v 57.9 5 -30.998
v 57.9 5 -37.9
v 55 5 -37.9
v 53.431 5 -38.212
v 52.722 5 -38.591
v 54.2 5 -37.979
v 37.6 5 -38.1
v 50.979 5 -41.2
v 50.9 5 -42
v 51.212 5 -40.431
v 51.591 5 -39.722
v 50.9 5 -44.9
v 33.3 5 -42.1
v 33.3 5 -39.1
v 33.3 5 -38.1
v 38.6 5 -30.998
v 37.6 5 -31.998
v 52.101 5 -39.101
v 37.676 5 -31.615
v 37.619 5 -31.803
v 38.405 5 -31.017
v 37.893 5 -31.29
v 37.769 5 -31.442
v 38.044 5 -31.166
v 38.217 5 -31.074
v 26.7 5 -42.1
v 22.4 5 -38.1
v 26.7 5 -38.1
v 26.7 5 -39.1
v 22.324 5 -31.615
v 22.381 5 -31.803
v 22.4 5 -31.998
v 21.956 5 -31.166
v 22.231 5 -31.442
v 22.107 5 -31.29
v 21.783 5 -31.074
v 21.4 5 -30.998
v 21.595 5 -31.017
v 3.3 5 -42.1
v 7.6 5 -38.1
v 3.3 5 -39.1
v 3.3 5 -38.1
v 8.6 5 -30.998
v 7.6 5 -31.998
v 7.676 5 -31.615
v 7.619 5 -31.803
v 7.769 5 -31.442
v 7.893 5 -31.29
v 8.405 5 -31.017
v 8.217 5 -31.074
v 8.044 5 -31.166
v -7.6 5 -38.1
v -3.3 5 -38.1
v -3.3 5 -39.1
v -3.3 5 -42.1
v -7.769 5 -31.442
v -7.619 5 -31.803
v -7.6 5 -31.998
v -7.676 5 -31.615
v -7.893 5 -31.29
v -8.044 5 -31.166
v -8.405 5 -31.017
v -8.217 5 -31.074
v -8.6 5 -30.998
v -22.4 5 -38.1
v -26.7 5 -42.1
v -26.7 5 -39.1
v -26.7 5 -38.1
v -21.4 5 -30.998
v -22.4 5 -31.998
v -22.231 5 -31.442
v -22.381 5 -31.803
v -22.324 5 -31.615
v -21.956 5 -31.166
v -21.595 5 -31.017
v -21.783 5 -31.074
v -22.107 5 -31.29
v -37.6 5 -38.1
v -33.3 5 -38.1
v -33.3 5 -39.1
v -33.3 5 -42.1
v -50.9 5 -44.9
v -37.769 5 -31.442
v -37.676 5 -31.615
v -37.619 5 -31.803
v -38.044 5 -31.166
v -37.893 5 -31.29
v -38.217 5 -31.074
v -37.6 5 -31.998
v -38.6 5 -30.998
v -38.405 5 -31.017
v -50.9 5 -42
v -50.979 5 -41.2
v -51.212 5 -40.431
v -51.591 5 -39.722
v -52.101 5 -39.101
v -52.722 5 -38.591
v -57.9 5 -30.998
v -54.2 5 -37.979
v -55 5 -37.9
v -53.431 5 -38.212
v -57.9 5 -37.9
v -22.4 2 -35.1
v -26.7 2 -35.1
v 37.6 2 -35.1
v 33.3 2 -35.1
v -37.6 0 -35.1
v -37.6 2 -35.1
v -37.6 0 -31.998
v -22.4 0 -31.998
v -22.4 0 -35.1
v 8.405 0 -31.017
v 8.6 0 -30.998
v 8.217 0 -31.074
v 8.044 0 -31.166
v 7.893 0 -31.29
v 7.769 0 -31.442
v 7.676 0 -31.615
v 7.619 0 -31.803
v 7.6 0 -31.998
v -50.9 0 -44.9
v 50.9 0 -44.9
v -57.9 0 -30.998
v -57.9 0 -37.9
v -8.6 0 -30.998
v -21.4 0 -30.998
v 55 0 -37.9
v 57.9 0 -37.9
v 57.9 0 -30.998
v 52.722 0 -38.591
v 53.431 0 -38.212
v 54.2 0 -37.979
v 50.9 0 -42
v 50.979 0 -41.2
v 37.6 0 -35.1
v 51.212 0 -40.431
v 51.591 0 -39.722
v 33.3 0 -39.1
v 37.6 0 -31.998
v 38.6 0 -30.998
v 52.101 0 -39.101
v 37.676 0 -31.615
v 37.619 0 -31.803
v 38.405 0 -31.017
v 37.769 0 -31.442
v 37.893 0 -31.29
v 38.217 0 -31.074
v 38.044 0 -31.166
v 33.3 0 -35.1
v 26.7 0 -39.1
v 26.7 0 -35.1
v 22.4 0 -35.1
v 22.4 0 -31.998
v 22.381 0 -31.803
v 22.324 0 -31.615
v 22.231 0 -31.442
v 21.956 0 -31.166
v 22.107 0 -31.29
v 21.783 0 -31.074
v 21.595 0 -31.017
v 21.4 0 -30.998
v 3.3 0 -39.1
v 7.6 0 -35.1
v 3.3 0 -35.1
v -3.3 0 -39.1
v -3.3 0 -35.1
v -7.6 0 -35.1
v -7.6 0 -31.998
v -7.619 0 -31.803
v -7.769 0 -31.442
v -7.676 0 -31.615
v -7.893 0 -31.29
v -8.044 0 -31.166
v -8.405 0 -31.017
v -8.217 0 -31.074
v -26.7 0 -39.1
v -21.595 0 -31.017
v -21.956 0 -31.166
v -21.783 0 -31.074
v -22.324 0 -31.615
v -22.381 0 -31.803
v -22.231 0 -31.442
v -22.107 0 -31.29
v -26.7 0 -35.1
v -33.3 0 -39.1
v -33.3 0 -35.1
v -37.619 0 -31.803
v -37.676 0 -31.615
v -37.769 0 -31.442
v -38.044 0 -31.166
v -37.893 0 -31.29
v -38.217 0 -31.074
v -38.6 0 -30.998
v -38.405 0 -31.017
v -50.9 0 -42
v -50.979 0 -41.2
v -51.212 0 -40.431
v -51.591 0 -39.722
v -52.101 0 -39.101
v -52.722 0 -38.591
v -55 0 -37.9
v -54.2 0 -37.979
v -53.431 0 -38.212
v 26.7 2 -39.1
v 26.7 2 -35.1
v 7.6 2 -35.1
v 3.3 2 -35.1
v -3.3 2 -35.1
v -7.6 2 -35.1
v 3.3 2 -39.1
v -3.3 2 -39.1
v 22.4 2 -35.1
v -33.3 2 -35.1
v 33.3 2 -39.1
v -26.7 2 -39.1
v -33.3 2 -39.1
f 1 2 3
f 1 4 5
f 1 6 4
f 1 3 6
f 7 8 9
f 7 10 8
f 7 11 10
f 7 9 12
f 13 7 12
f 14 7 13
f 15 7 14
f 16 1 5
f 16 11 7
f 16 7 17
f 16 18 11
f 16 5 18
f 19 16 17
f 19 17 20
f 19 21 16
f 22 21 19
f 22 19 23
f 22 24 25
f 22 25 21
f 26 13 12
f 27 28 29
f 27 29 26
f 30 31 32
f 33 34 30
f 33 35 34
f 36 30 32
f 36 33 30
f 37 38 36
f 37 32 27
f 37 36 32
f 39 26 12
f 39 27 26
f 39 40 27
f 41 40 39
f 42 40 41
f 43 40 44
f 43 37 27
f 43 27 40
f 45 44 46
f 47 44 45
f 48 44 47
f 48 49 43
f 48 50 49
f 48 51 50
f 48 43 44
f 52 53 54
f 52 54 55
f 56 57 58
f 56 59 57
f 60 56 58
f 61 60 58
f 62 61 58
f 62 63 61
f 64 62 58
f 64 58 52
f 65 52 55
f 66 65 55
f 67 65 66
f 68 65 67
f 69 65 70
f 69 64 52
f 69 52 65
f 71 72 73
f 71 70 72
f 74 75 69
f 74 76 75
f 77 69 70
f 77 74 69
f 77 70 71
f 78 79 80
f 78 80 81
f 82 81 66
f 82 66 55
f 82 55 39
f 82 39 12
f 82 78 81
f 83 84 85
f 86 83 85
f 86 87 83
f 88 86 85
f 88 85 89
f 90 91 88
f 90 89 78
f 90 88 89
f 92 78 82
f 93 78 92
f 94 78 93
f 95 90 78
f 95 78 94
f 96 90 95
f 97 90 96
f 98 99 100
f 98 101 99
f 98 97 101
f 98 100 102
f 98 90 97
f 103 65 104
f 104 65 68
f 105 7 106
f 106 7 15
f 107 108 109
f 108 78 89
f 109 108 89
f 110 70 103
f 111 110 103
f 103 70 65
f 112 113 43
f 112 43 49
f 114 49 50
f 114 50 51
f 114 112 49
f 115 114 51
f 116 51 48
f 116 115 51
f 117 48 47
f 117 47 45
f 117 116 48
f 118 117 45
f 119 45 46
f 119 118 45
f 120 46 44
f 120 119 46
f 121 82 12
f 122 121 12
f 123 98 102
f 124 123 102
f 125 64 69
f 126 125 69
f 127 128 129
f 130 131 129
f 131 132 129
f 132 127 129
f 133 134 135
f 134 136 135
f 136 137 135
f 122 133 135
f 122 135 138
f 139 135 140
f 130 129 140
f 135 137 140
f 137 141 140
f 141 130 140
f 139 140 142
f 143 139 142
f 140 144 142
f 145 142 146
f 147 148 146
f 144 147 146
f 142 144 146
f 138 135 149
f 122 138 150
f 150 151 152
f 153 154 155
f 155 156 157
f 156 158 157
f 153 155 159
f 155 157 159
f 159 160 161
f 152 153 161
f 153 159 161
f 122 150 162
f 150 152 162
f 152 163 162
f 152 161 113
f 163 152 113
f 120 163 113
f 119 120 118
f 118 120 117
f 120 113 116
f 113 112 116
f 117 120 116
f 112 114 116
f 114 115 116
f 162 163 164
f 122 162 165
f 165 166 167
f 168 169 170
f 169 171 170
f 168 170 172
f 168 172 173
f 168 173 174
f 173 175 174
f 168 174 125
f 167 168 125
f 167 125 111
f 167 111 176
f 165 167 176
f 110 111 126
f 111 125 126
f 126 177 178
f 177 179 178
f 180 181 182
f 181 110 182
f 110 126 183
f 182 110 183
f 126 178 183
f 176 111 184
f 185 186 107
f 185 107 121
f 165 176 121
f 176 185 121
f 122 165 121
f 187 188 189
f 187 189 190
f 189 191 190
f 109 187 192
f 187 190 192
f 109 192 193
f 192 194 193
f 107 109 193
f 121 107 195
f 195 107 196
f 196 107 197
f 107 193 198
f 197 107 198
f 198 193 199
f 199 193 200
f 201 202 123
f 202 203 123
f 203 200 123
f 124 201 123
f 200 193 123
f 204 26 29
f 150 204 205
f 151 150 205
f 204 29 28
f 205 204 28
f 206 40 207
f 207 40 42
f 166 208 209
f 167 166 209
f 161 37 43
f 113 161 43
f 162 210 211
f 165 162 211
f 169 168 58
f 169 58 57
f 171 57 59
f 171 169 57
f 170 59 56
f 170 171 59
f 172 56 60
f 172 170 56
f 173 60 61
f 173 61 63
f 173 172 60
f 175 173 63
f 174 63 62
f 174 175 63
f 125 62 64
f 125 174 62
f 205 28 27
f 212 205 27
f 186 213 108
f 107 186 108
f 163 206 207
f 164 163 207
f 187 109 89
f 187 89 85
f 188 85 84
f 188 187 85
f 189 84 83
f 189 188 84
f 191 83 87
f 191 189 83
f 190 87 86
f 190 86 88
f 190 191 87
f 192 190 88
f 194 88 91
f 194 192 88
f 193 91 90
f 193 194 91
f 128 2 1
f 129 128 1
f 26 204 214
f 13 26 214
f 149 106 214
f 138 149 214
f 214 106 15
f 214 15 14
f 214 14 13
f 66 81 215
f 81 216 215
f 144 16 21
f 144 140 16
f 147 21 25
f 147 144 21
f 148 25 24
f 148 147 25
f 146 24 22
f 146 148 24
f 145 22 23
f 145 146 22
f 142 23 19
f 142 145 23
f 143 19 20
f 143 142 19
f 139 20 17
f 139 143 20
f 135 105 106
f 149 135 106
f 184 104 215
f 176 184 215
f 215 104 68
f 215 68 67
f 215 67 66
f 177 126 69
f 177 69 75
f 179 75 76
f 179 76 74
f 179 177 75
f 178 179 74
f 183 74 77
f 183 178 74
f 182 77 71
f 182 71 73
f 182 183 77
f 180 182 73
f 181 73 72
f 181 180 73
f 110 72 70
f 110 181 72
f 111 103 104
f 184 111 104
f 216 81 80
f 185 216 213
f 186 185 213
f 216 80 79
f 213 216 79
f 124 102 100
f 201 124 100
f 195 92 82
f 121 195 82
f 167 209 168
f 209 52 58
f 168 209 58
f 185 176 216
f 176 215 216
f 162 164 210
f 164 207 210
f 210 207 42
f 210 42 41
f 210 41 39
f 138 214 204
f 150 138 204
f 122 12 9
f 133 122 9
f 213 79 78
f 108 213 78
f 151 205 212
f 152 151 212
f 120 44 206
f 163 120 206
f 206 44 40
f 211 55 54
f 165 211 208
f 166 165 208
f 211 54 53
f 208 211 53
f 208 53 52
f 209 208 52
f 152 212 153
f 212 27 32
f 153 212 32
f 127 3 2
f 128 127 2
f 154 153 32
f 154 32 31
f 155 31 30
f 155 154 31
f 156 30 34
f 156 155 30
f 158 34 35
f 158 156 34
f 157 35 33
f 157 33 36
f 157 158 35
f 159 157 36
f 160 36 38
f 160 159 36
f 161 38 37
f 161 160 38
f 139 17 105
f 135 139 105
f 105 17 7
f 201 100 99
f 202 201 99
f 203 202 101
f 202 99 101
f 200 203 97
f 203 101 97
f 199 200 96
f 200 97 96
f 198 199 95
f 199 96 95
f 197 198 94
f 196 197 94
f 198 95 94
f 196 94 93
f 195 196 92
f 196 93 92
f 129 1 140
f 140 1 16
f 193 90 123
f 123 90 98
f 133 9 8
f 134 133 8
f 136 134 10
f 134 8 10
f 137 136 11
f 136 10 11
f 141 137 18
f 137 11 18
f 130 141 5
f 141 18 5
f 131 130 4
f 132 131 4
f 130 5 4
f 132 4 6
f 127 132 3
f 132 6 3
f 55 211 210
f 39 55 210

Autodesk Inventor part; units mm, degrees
ref_plane "YZ Plane" through (0, 0, 0) normal (1, 0, 0) x (0, 1, 0)
ref_plane "XZ Plane" through (0, 0, 0) normal (0, 1, 0) x (-1, 0, 0)
ref_plane "XY Plane" through (0, 0, 0) normal (0, 0, 1) x (1, 0, 0)
sketch "Esquisse1" plane through (0, 0, 0) normal (0, 1, 0) x (-1, 0, 0)
  line L0 (60, -42) -> (60, 42)
  line L1 (55, 39) -> (57, 39)
  arc A0 (52, 42) -> (55, 39) centre (55, 42) ccw
  line L2 (52, 44) -> (52, 42)
  line L3 (55, 46) -> (-55, 46)
  circle A1 centre (55, 42.115) radius 2
  arc A2 (60, 42) -> (55, 47) centre (55, 42) ccw
  line L4 (55, 47) -> (-55, 47)
  line L5 (-55, 47) -> (55, 47)
  line L6 (51, 45) -> (-51, 45)
  line L7 (-52, 42) -> (-51, 42)
  arc A3 (-57, 39) -> (-58, 38) centre (-57, 38) ccw
  circle A4 centre (-55, 42.115) radius 2
  line L8 (-55, 39) -> (-55, 38)
  line L9 (-52, 44) -> (-52, 42)
  arc A5 (-51, 45) -> (-52, 44) centre (-51, 44) ccw
  line L10 (-55, 39) -> (-57, 39)
  arc A6 (-55, 39) -> (-52, 42) centre (-55, 42) ccw
  arc A7 (-57, 39) -> (-58, 38) centre (-57, 38) ccw
  circle A8 centre (55, -42.115) radius 2
  line L11 (-55, -39) -> (-57, -39)
  arc A9 (-52, -42) -> (-55, -39) centre (-55, -42) ccw
  line L12 (-52, -44) -> (-52, -42)
  line L13 (52, -42) -> (52, -44)
  circle A10 centre (-55, -42.115) radius 2
  line L14 (-51, -45) -> (51, -45)
  line L15 (51, -45) -> (-51, -45)
  line L16 (-55, -46) -> (55, -46)
  line L17 (-55, -47) -> (55, -47)
  line L18 (55, -47) -> (-55, -47)
  arc A11 (-51, 45) -> (-52, 44) centre (-51, 44) ccw
  line L19 (-52, 42) -> (-52, 44)
  arc A12 (-55, 46) -> (-59, 42) centre (-55, 42) ccw
  line L20 (-51, 42) -> (-51, 45)
  arc A13 (-55, 47) -> (-60, 42) centre (-55, 42) ccw
  circle A14 centre (-55, 42.115) radius 2
  line L21 (-55, 46) -> (-55, 47)
  arc A15 (-55, 47) -> (-60, 42) centre (-55, 42) ccw
  line L22 (52, -42) -> (51, -42)
  arc A16 (51, -45) -> (52, -44) centre (51, -44) ccw
  line L23 (-51, 45) -> (51, 45)
  arc A17 (52, 42) -> (55, 39) centre (55, 42) ccw
  line L24 (55, -39) -> (55, -38)
  line L25 (57, -39) -> (55, -39)
  line L26 (55, -39) -> (57, -39)
  arc A18 (55, -39) -> (52, -42) centre (55, -42) ccw
  arc A19 (57, -39) -> (58, -38) centre (57, -38) ccw
  line L27 (52, -44) -> (52, -42)
  arc A20 (51, -45) -> (52, -44) centre (51, -44) ccw
  circle A21 centre (55, -42.115) radius 2
  arc A22 (57, -39) -> (58, -38) centre (57, -38) ccw
  line L28 (58, 38) -> (58, -38)
  circle A23 centre (55, 42.115) radius 2
  line L29 (52, 42) -> (52, 44)
  line L30 (52, 42) -> (51, 42)
  arc A24 (52, 44) -> (51, 45) centre (51, 44) ccw
  line L31 (55, 39) -> (55, 38)
  arc A25 (52, 44) -> (51, 45) centre (51, 44) ccw
  arc A26 (58, 38) -> (57, 39) centre (57, 38) ccw
  arc A27 (58, 38) -> (57, 39) centre (57, 38) ccw
  line L32 (57, 39) -> (55, 39)
  line L33 (58, -38) -> (58, 38)
  line L34 (58, -38) -> (55, -38)
  line L35 (55, 46) -> (55, 47)
  arc A28 (59, 42) -> (55, 46) centre (55, 42) ccw
  arc A29 (60, 42) -> (55, 47) centre (55, 42) ccw
  line L36 (59, -42) -> (59, 42)
  line L37 (59, 42) -> (60, 42)
  line L38 (60, 42) -> (60, -42)
  line L39 (51, 45) -> (51, 42)
  arc A30 (51, 42) -> (55, 38) centre (55, 42) ccw
  line L40 (55, 38) -> (58, 38)
  arc A31 (55, -39) -> (52, -42) centre (55, -42) ccw
  arc A32 (55, -47) -> (60, -42) centre (55, -42) ccw
  line L41 (-55, -38) -> (-58, -38)
  arc A33 (-51, -42) -> (-55, -38) centre (-55, -42) ccw
  line L42 (-52, -42) -> (-51, -42)
  line L43 (-52, -42) -> (-52, -44)
  line L44 (-51, -45) -> (-51, -42)
  arc A34 (-52, -44) -> (-51, -45) centre (-51, -44) ccw
  circle A35 centre (-55, -42.115) radius 2
  line L45 (-55, -46) -> (-55, -47)
  arc A36 (-59, -42) -> (-55, -46) centre (-55, -42) ccw
  arc A37 (-60, -42) -> (-55, -47) centre (-55, -42) ccw
  line L46 (-60, -42) -> (-59, -42)
  arc A38 (-60, -42) -> (-55, -47) centre (-55, -42) ccw
  arc A39 (-58, -38) -> (-57, -39) centre (-57, -38) ccw
  line L47 (-57, 39) -> (-55, 39)
  arc A40 (-55, 39) -> (-52, 42) centre (-55, 42) ccw
  line L48 (-55, -39) -> (-55, -38)
  line L49 (-58, -38) -> (-58, 38)
  arc A41 (-52, -44) -> (-51, -45) centre (-51, -44) ccw
  arc A42 (-58, -38) -> (-57, -39) centre (-57, -38) ccw
  line L50 (-60, 42) -> (-60, -42)
  arc A43 (-52, -42) -> (-55, -39) centre (-55, -42) ccw
  line L51 (-57, -39) -> (-55, -39)
  line L52 (-58, 38) -> (-58, -38)
  line L53 (-58, 38) -> (-55, 38)
  arc A44 (-55, 38) -> (-51, 42) centre (-55, 42) ccw
  line L54 (-59, 42) -> (-60, 42)
  line L55 (-60, -42) -> (-60, 42)
  line L56 (-59, 42) -> (-59, -42)
  line L57 (55, -46) -> (55, -47)
  arc A45 (55, -38) -> (51, -42) centre (55, -42) ccw
  line L58 (51, -42) -> (51, -45)
  arc A46 (55, -46) -> (59, -42) centre (55, -42) ccw
  line L59 (59, -42) -> (60, -42)
  arc A47 (55, -47) -> (60, -42) centre (55, -42) ccw
  line L60 (-37.5, -35) -> (-22.5, -35)
  line L61 (-37.5, -35) -> (-22.5, -35)
  line L62 (-33.25, 35) -> (-37.5, 35)
  line L63 (-33.25, 35) -> (-31.25, 35)
  line L64 (-31.25, 32) -> (-33.25, 32)
  line L65 (-31.25, 35) -> (-31.25, 32)
  line L66 (-31.25, 32) -> (-33.25, 32)
  line L67 (-28.75, 35) -> (-31.25, 35)
  line L68 (-28.75, 32) -> (-28.75, 35)
  line L69 (-28.75, 32) -> (-28.75, 35)
  line L70 (-26.75, 32) -> (-28.75, 32)
  line L71 (-26.75, 32) -> (-28.75, 32)
  line L72 (-22.5, 35) -> (-37.5, 35)
  line L73 (-22.5, 35) -> (-26.75, 35)
  line L74 (-37.5, 35) -> (-37.5, -35)
  line L75 (-37.5, 35) -> (-37.5, -35)
  line L76 (-22.5, -35) -> (-22.5, 35)
  line L77 (-22.5, -35) -> (-22.5, 35)
  line L78 (-28.75, 35) -> (-26.75, 35)
  line L79 (-31.25, 35) -> (-31.25, 32)
  line L80 (-26.75, 35) -> (-26.75, 32)
  line L81 (-26.75, 35) -> (-26.75, 32)
  line L82 (-33.25, 32) -> (-33.25, 35)
  line L83 (-33.25, 32) -> (-33.25, 35)
  line L84 (-7.5, -35) -> (7.5, -35)
  line L85 (-7.5, -35) -> (7.5, -35)
  line L86 (-3.25, 35) -> (-7.5, 35)
  line L87 (-3.25, 35) -> (-1.25, 35)
  line L88 (-1.25, 32) -> (-3.25, 32)
  line L89 (-1.25, 35) -> (-1.25, 32)
  line L90 (-1.25, 32) -> (-3.25, 32)
  line L91 (1.25, 35) -> (-1.25, 35)
  line L92 (1.25, 32) -> (1.25, 35)
  line L93 (1.25, 32) -> (1.25, 35)
  line L94 (3.25, 32) -> (1.25, 32)
  line L95 (3.25, 32) -> (1.25, 32)
  line L96 (7.5, 35) -> (-7.5, 35)
  line L97 (7.5, 35) -> (3.25, 35)
  line L98 (-7.5, 35) -> (-7.5, -35)
  line L99 (-7.5, 35) -> (-7.5, -35)
  line L100 (7.5, -35) -> (7.5, 35)
  line L101 (7.5, -35) -> (7.5, 35)
  line L102 (1.25, 35) -> (3.25, 35)
  line L103 (-1.25, 35) -> (-1.25, 32)
  line L104 (3.25, 35) -> (3.25, 32)
  line L105 (3.25, 35) -> (3.25, 32)
  line L106 (-3.25, 32) -> (-3.25, 35)
  line L107 (-3.25, 32) -> (-3.25, 35)
  line L108 (22.5, -35) -> (37.5, -35)
  line L109 (22.5, -35) -> (37.5, -35)
  line L110 (26.75, 35) -> (22.5, 35)
  line L111 (26.75, 35) -> (28.75, 35)
  line L112 (28.75, 32) -> (26.75, 32)
  line L113 (28.75, 35) -> (28.75, 32)
  line L114 (28.75, 32) -> (26.75, 32)
  line L115 (31.25, 35) -> (28.75, 35)
  line L116 (31.25, 32) -> (31.25, 35)
  line L117 (31.25, 32) -> (31.25, 35)
  line L118 (33.25, 32) -> (31.25, 32)
  line L119 (33.25, 32) -> (31.25, 32)
  line L120 (37.5, 35) -> (22.5, 35)
  line L121 (37.5, 35) -> (33.25, 35)
  line L122 (22.5, 35) -> (22.5, -35)
  line L123 (22.5, 35) -> (22.5, -35)
  line L124 (37.5, -35) -> (37.5, 35)
  line L125 (37.5, -35) -> (37.5, 35)
  line L126 (31.25, 35) -> (33.25, 35)
  line L127 (28.75, 35) -> (28.75, 32)
  line L128 (33.25, 35) -> (33.25, 32)
  line L129 (33.25, 35) -> (33.25, 32)
  line L130 (26.75, 32) -> (26.75, 35)
  line L131 (26.75, 32) -> (26.75, 35)
  line L132 (55, -42) -> (-55, 42) construction
  line L133 (55, 42) -> (-55, -42) construction
  line L134 (58, -30.8976) -> (-58, -30.8976)
  point P0 (0, 0)
  point P1 (0, 0)
  point P2 (37.5, -30.8976)
  point P3 (22.5, -30.8976)
  point P4 (7.5, -30.8976)
  point P5 (-7.5, -30.8976)
  point P6 (-22.5, -30.8976)
  point P7 (-37.5, -30.8976)
  point P8 (-58, -30.8976)
extrude "Extrusion1" add sketch "Esquisse1" along normal blind 5 contours L28 L34 A45 L58 L14 L44 A33 L41 L49 L134 L74 L60 L76 L98 L84 L100 L122 L108 L124
sketch "Esquisse2" plane through (0, 5, 0) normal (0, 1, 0) x (1, 0, 0)
  line L0 (-58, 38) -> (-58, 30.8976) projected
  line L1 (-58, 30.8976) -> (-37.5, 30.8976) projected
  line L2 (-37.5, 30.8976) -> (-37.5, 35) projected
  line L3 (-37.5, 35) -> (-22.5, 35) projected
  line L4 (-22.5, 35) -> (-22.5, 30.8976) projected
  line L5 (-22.5, 30.8976) -> (-7.5, 30.8976) projected
  line L6 (-7.5, 30.8976) -> (-7.5, 35) projected
  line L7 (-7.5, 35) -> (7.5, 35) projected
  line L8 (7.5, 35) -> (7.5, 30.8976) projected
  line L9 (7.5, 30.8976) -> (22.5, 30.8976) projected
  line L10 (22.5, 30.8976) -> (22.5, 35) projected
  line L11 (22.5, 35) -> (37.5, 35) projected
  line L12 (37.5, 35) -> (37.5, 30.8976) projected
  line L13 (37.5, 30.8976) -> (58, 30.8976) projected
  line L14 (58, 30.8976) -> (58, 38) projected
  line L15 (58, 38) -> (55, 38) projected
  arc A0 (51, 42) -> (55, 38) centre (55, 42) ccw projected
  line L16 (51, 42) -> (51, 45) projected
  line L17 (51, 45) -> (-51, 45) projected
  line L18 (-51, 45) -> (-51, 42) projected
  arc A1 (-55, 38) -> (-51, 42) centre (-55, 42) ccw projected
  line L19 (-55, 38) -> (-58, 38) projected
  line L20 (-50.9, 44.9) -> (50.9, 44.9)
  line L21 (50.9, 44.9) -> (50.9, 42)
  arc A2 (50.9, 42) -> (55, 37.9) centre (55, 42) ccw
  line L22 (55, 37.9) -> (57.9, 37.9)
  line L23 (57.9, 37.9) -> (57.9, 30.9976)
  line L24 (57.9, 30.9976) -> (37.6, 30.9976)
  line L25 (37.6, 30.9976) -> (37.6, 35.1)
  line L26 (37.6, 35.1) -> (22.4, 35.1)
  line L27 (22.4, 35.1) -> (22.4, 30.9976)
  line L28 (22.4, 30.9976) -> (7.6, 30.9976)
  line L29 (7.6, 30.9976) -> (7.6, 35.1)
  line L30 (7.6, 35.1) -> (-7.6, 35.1)
  line L31 (-7.6, 35.1) -> (-7.6, 30.9976)
  line L32 (-7.6, 30.9976) -> (-22.4, 30.9976)
  line L33 (-22.4, 30.9976) -> (-22.4, 35.1)
  line L34 (-22.4, 35.1) -> (-37.6, 35.1)
  line L35 (-37.6, 35.1) -> (-37.6, 30.9976)
  line L36 (-37.6, 30.9976) -> (-57.9, 30.9976)
  line L37 (-57.9, 30.9976) -> (-57.9, 37.9)
  line L38 (-57.9, 37.9) -> (-55, 37.9)
  arc A3 (-55, 37.9) -> (-50.9, 42) centre (-55, 42) ccw
  line L39 (-50.9, 42) -> (-50.9, 44.9)
  point P0 (0, 0)
  dimension "d2" = 0.1
extrude "Extrusion2" cut sketch "Esquisse2" against normal blind 5
chamfer "Chanfrein1" distance 3 angle 45 3 edges at (-30, 5, -35.1) (0, 5, -35.1) (30, 5, -35.1)
fillet "Congé1" radius 1 6 edges at (-37.6, 2.5, -30.9976) (-22.4, 2.5, -30.9976) (-7.6, 2.5, -30.9976) (7.6, 2.5, -30.9976) (22.4, 2.5, -30.9976) (37.6, 2.5, -30.9976)
sketch "Esquisse4" plane through (0, 5, 0) normal (0, 1, 0) x (1, 0, 0)
  line L0 (-33.3, 31.1) -> (-26.7, 31.1)
  line L1 (-26.7, 31.1) -> (-26.7, 39.1)
  line L2 (-26.7, 39.1) -> (-33.3, 39.1)
  line L3 (-33.3, 39.1) -> (-33.3, 31.1)
  line L4 (-22.4, 35.1) -> (-37.6, 35.1) projected
  line L5 (-33.3, 31.1) -> (-26.7, 39.1) construction
  line L6 (-26.7, 31.1) -> (-33.3, 39.1) construction
  line L7 (-3.3, 31.1) -> (3.3, 31.1)
  line L8 (3.3, 31.1) -> (3.3, 39.1)
  line L9 (3.3, 39.1) -> (-3.3, 39.1)
  line L10 (-3.3, 39.1) -> (-3.3, 31.1)
  line L11 (7.6, 35.1) -> (-7.6, 35.1) projected
  line L12 (-3.3, 31.1) -> (3.3, 39.1) construction
  line L13 (3.3, 31.1) -> (-3.3, 39.1) construction
  line L14 (26.7, 31.1) -> (33.3, 31.1)
  line L15 (33.3, 31.1) -> (33.3, 39.1)
  line L16 (33.3, 39.1) -> (26.7, 39.1)
  line L17 (26.7, 39.1) -> (26.7, 31.1)
  line L18 (37.6, 35.1) -> (22.4, 35.1) projected
  line L19 (26.7, 31.1) -> (33.3, 39.1) construction
  line L20 (33.3, 31.1) -> (26.7, 39.1) construction
  point P0 (0, 0)
  point P1 (-30, 35.1)
  point P2 (0, 35.1)
  point P3 (30, 35.1)
  point P4 (26.7, 35.1)
  point P5 (33.3, 35.1)
  point P6 (-3.3, 35.1)
  point P7 (3.3, 35.1)
  point P8 (-33.3, 35.1)
  point P9 (-26.7, 35.1)
  dimension "d9" = 6.6
  dimension "d10" = 8
  dimension "d11" = 6.6
  dimension "d12" = 8
  dimension "d13" = 6.6
extrude "Extrusion3" cut sketch "Esquisse4" against normal blind 5 contours L3 L2 L1 L4 | L10 L9 L8 L11 | L17 L16 L15 L18
chamfer "Chanfrein2" distance 3 angle 45 3 edges at (-30, 5, -39.1) (0, 5, -39.1) (30, 5, -39.1)
properties part number "Centreur_resistance"
